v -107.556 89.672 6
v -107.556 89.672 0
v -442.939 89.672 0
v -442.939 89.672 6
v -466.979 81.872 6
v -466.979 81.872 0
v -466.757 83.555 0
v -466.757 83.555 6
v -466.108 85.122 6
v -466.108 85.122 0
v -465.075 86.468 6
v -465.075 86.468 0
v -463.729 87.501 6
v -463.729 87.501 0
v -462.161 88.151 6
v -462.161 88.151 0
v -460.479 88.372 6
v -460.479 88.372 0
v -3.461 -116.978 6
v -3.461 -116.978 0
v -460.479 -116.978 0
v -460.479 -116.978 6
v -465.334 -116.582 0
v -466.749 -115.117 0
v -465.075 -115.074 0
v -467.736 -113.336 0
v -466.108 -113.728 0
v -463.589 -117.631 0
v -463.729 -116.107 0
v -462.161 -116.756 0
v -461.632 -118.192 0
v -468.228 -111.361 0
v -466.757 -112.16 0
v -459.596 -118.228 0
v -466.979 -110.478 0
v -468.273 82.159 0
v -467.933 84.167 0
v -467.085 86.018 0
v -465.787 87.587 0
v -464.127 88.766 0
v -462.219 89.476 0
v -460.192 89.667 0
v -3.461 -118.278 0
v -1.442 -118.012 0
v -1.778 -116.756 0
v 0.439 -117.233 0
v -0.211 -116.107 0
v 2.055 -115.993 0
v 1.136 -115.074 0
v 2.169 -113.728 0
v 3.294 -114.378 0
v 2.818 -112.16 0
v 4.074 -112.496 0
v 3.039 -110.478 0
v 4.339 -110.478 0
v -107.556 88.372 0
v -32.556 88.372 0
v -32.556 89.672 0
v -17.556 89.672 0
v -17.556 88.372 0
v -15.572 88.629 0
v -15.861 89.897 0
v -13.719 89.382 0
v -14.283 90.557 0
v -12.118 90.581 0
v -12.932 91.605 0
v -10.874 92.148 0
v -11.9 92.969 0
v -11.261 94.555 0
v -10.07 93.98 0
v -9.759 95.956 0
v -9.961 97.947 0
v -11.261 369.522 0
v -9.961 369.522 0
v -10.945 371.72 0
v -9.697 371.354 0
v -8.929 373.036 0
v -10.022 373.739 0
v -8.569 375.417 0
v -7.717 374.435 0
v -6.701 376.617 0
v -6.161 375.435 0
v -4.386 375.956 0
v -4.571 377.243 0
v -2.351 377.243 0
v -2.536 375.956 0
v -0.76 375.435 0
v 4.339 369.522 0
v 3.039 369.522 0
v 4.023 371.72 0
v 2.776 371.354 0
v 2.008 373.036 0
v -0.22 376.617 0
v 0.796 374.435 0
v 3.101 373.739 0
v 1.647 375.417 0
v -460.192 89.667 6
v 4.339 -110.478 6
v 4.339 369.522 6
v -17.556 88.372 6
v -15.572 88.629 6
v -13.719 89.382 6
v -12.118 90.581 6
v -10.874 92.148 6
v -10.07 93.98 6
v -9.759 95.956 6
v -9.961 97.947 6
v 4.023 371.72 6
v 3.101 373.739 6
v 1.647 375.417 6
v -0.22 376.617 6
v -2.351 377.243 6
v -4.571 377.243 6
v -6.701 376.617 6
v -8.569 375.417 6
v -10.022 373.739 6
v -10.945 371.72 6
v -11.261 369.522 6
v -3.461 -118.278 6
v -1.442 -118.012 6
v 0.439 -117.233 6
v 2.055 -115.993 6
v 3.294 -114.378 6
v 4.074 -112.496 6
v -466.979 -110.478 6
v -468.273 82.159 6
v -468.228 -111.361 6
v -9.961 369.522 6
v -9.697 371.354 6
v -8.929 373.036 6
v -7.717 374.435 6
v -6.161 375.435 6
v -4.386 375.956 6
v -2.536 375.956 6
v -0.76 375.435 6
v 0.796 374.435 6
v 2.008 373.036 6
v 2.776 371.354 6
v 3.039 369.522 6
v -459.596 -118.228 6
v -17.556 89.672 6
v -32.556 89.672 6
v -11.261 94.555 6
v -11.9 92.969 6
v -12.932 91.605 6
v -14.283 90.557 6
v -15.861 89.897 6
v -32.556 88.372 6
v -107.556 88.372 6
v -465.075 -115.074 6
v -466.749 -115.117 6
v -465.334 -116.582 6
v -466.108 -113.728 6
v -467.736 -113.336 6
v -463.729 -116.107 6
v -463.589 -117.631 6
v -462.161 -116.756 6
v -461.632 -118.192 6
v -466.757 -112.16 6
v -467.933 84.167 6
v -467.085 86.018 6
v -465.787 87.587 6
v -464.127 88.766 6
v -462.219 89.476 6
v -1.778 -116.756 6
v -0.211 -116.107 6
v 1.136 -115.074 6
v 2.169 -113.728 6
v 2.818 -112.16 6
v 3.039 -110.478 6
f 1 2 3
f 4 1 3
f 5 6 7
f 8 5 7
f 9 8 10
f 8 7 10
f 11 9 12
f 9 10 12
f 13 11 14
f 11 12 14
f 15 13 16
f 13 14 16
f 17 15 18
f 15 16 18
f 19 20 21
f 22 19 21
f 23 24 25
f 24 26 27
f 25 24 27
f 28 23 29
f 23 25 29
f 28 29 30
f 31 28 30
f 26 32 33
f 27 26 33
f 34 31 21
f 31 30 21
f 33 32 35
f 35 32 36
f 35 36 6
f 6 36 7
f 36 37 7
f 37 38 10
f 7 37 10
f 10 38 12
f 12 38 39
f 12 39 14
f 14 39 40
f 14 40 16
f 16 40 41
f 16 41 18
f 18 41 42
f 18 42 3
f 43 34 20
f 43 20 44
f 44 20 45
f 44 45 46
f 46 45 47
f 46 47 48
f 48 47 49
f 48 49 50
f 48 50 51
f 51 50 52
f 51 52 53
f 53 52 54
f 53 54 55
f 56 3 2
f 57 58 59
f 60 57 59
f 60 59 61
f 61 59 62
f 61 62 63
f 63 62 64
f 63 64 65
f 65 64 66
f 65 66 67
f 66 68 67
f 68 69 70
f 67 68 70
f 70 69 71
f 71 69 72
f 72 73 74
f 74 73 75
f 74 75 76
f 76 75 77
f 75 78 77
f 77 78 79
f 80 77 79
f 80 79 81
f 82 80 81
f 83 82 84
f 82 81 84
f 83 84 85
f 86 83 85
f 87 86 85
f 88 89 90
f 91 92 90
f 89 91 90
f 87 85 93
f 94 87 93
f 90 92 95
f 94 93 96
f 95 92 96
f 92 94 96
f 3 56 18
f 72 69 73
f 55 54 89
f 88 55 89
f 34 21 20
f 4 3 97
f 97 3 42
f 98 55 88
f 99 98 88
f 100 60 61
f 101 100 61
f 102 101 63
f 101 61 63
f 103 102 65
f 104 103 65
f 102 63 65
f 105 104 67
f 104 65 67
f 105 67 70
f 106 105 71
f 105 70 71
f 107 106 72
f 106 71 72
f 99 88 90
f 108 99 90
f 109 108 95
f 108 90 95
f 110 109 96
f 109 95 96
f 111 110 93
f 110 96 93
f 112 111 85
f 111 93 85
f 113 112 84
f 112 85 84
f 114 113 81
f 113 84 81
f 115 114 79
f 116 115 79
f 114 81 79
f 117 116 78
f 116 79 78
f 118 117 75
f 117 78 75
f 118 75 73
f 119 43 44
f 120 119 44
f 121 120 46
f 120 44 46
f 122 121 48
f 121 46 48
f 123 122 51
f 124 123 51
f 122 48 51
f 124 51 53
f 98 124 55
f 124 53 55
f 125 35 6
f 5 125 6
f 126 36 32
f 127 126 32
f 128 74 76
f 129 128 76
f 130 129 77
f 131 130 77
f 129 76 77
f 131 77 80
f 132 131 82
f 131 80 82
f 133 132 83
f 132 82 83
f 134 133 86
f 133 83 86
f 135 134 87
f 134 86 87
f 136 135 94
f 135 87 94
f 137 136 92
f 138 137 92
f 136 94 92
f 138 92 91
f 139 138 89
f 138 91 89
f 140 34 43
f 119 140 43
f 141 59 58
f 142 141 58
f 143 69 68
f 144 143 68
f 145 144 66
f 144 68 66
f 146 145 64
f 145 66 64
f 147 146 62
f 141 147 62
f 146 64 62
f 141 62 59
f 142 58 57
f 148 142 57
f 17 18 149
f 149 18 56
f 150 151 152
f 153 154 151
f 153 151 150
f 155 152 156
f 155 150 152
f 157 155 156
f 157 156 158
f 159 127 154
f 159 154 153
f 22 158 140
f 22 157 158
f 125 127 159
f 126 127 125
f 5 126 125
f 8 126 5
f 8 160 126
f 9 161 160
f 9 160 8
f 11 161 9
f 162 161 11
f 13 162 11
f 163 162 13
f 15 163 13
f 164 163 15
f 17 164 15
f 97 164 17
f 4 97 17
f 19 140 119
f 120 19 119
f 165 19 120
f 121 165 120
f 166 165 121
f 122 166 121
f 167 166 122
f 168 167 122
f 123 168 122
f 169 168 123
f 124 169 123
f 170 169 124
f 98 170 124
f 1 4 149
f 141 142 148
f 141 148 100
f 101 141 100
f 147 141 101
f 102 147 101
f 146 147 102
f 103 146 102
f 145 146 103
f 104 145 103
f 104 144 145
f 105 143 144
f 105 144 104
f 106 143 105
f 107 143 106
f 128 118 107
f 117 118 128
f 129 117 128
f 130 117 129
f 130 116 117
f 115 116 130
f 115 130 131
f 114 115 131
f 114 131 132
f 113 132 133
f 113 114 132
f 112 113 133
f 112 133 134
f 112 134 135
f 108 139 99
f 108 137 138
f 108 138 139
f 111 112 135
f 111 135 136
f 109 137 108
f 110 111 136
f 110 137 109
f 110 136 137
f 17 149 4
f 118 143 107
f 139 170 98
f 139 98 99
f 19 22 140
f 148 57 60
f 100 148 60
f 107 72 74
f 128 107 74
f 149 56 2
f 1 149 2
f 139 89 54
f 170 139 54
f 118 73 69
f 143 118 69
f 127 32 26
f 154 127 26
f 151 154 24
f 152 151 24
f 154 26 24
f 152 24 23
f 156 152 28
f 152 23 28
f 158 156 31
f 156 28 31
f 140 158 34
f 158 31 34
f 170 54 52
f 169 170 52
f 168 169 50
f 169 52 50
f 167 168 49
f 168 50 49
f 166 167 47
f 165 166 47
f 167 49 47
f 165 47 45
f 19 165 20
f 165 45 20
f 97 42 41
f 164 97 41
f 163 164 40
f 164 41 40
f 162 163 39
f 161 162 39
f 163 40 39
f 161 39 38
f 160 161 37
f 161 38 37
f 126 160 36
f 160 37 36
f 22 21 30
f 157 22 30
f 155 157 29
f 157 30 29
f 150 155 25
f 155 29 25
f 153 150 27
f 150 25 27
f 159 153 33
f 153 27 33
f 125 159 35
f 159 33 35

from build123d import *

# Parameters (mm, degrees)
F1_DEPTH = 6


with BuildPart() as f1:
    # F0 (on Top) → F1 (new body)
    with BuildSketch(Plane.XY):
        with BuildLine():
            ThreePointArc((-460.478625, -116.977697), (-465.074819, -115.073891), (-466.978625, -110.477697))
            Line((-466.978625, -110.477697), (-466.978625, 81.872303))
            ThreePointArc((-466.978625, 81.872303), (-465.074819, 86.468497), (-460.478625, 88.372303))
            Line((-460.478625, 88.372303), (-243.538855, 88.372303))
            Line((-243.538855, 88.372303), (-107.556077, 88.372303))
            Line((-107.556077, 88.372303), (-107.556077, 89.672303))
            Line((-107.556077, 89.672303), (-442.939144, 89.672303))
            Line((-442.939144, 89.672303), (-460.191501, 89.667017))
            ThreePointArc((-460.191501, 89.667017), (-465.787292, 87.587026), (-468.273338, 82.159427))
            Line((-468.273338, 82.159427), (-468.228486, -111.360677))
            ThreePointArc((-468.228486, -111.360677), (-465.334242, -116.582037), (-459.595644, -118.227558))
            Line((-459.595644, -118.227558), (-3.460598, -118.277697))
            ThreePointArc((-3.460598, -118.277697), (2.054834, -115.99313), (4.339402, -110.477697))
            Line((4.339402, -110.477697), (4.339402, 369.522303))
            ThreePointArc((4.339402, 369.522303), (-3.460598, 377.322303), (-11.260598, 369.522303))
            Line((-11.260598, 369.522303), (-11.260598, 94.554604))
            ThreePointArc((-11.260598, 94.554604), (-13.572677, 91.035911), (-17.556077, 89.672303))
            Line((-17.556077, 89.672303), (-32.556077, 89.672303))
            Line((-32.556077, 89.672303), (-32.556077, 88.372303))
            Line((-32.556077, 88.372303), (-17.556077, 88.372303))
            ThreePointArc((-17.556077, 88.372303), (-11.445398, 91.324664), (-9.960598, 97.946763))
            Line((-9.960598, 97.946763), (-9.960598, 369.522303))
            ThreePointArc((-9.960598, 369.522303), (-3.460598, 376.022303), (3.039402, 369.522303))
            Line((3.039402, 369.522303), (3.039402, -110.477697))
            ThreePointArc((3.039402, -110.477697), (1.135596, -115.073891), (-3.460598, -116.977697))
            Line((-3.460598, -116.977697), (-460.478625, -116.977697))
        make_face()
    extrude(amount=F1_DEPTH)


solid = f1.part
